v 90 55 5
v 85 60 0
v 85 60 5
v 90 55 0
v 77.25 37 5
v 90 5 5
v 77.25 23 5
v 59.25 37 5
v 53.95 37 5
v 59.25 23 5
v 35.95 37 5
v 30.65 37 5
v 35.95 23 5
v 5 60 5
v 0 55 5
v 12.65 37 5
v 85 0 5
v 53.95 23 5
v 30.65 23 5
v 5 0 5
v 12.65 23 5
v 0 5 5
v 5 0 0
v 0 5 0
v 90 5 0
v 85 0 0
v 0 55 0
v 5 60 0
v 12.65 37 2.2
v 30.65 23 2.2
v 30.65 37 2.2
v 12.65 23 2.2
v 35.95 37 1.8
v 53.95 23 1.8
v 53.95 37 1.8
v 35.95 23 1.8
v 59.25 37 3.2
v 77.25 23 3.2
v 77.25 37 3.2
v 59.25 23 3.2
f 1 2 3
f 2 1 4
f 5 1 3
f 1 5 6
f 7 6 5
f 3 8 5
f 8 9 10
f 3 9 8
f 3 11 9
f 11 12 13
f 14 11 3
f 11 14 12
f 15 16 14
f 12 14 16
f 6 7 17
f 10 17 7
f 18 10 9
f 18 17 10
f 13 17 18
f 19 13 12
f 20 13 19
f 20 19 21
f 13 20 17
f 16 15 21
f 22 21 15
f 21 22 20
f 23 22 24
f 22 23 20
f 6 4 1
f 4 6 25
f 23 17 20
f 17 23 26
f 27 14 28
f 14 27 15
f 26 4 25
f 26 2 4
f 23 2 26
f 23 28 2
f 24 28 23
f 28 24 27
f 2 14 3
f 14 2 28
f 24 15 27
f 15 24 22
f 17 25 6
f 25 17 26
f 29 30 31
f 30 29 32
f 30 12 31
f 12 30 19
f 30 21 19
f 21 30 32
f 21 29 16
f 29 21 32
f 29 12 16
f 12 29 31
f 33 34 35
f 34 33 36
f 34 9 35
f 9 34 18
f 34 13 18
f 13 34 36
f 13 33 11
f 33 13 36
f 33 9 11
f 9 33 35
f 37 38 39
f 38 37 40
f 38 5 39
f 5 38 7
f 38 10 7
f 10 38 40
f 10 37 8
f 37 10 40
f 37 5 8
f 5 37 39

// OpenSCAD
$fn = 32;

// ----------------------------------------------------------------------
// Windowed plate: 3 voids, 90 x 60 x 5 mm
// ----------------------------------------------------------------------

// --- parameters (mm) ---
plate_l = 90;             // plate length, X
plate_w = 60;             // plate width, Y
plate_t = 5;              // plate thickness, Z
edge_margin = 10;         // wall from the plate edge to any window
windows = 3;              // number of windows in the row
win_l = 18;               // window length
win_w = 14;               // window width
win_pitch = 23.3;         // window pitch along X
depth_1 = 2.8;            // depth of void 1 (full thickness = through)
depth_2 = 3.2;            // depth of void 2 (full thickness = through)
depth_3 = 1.8;            // depth of void 3 (full thickness = through)
corner_c = 5;             // corner chamfer of the plate

profile = [[5, 0], [85, 0], [90, 5], [90, 55], [85, 60], [5, 60], [0, 55], [0, 5]];  // primary outline, 8 points, counter clockwise
void_1 = [[12.65, 23], [30.65, 23], [30.65, 37], [12.65, 37]];  // window 1 of the row, 4 points
void_2 = [[35.95, 23], [53.95, 23], [53.95, 37], [35.95, 37]];  // window 2 of the row, 4 points
void_3 = [[59.25, 23], [77.25, 23], [77.25, 37], [59.25, 37]];  // window 3 of the row, 4 points

// --- the one profile operation ---
difference() {
  linear_extrude(height = plate_t) polygon(points = profile);
  translate([0, 0, plate_t - depth_1])
    linear_extrude(height = depth_1 + 1) polygon(points = void_1);
  translate([0, 0, plate_t - depth_2])
    linear_extrude(height = depth_2 + 1) polygon(points = void_2);
  translate([0, 0, plate_t - depth_3])
    linear_extrude(height = depth_3 + 1) polygon(points = void_3);
}
